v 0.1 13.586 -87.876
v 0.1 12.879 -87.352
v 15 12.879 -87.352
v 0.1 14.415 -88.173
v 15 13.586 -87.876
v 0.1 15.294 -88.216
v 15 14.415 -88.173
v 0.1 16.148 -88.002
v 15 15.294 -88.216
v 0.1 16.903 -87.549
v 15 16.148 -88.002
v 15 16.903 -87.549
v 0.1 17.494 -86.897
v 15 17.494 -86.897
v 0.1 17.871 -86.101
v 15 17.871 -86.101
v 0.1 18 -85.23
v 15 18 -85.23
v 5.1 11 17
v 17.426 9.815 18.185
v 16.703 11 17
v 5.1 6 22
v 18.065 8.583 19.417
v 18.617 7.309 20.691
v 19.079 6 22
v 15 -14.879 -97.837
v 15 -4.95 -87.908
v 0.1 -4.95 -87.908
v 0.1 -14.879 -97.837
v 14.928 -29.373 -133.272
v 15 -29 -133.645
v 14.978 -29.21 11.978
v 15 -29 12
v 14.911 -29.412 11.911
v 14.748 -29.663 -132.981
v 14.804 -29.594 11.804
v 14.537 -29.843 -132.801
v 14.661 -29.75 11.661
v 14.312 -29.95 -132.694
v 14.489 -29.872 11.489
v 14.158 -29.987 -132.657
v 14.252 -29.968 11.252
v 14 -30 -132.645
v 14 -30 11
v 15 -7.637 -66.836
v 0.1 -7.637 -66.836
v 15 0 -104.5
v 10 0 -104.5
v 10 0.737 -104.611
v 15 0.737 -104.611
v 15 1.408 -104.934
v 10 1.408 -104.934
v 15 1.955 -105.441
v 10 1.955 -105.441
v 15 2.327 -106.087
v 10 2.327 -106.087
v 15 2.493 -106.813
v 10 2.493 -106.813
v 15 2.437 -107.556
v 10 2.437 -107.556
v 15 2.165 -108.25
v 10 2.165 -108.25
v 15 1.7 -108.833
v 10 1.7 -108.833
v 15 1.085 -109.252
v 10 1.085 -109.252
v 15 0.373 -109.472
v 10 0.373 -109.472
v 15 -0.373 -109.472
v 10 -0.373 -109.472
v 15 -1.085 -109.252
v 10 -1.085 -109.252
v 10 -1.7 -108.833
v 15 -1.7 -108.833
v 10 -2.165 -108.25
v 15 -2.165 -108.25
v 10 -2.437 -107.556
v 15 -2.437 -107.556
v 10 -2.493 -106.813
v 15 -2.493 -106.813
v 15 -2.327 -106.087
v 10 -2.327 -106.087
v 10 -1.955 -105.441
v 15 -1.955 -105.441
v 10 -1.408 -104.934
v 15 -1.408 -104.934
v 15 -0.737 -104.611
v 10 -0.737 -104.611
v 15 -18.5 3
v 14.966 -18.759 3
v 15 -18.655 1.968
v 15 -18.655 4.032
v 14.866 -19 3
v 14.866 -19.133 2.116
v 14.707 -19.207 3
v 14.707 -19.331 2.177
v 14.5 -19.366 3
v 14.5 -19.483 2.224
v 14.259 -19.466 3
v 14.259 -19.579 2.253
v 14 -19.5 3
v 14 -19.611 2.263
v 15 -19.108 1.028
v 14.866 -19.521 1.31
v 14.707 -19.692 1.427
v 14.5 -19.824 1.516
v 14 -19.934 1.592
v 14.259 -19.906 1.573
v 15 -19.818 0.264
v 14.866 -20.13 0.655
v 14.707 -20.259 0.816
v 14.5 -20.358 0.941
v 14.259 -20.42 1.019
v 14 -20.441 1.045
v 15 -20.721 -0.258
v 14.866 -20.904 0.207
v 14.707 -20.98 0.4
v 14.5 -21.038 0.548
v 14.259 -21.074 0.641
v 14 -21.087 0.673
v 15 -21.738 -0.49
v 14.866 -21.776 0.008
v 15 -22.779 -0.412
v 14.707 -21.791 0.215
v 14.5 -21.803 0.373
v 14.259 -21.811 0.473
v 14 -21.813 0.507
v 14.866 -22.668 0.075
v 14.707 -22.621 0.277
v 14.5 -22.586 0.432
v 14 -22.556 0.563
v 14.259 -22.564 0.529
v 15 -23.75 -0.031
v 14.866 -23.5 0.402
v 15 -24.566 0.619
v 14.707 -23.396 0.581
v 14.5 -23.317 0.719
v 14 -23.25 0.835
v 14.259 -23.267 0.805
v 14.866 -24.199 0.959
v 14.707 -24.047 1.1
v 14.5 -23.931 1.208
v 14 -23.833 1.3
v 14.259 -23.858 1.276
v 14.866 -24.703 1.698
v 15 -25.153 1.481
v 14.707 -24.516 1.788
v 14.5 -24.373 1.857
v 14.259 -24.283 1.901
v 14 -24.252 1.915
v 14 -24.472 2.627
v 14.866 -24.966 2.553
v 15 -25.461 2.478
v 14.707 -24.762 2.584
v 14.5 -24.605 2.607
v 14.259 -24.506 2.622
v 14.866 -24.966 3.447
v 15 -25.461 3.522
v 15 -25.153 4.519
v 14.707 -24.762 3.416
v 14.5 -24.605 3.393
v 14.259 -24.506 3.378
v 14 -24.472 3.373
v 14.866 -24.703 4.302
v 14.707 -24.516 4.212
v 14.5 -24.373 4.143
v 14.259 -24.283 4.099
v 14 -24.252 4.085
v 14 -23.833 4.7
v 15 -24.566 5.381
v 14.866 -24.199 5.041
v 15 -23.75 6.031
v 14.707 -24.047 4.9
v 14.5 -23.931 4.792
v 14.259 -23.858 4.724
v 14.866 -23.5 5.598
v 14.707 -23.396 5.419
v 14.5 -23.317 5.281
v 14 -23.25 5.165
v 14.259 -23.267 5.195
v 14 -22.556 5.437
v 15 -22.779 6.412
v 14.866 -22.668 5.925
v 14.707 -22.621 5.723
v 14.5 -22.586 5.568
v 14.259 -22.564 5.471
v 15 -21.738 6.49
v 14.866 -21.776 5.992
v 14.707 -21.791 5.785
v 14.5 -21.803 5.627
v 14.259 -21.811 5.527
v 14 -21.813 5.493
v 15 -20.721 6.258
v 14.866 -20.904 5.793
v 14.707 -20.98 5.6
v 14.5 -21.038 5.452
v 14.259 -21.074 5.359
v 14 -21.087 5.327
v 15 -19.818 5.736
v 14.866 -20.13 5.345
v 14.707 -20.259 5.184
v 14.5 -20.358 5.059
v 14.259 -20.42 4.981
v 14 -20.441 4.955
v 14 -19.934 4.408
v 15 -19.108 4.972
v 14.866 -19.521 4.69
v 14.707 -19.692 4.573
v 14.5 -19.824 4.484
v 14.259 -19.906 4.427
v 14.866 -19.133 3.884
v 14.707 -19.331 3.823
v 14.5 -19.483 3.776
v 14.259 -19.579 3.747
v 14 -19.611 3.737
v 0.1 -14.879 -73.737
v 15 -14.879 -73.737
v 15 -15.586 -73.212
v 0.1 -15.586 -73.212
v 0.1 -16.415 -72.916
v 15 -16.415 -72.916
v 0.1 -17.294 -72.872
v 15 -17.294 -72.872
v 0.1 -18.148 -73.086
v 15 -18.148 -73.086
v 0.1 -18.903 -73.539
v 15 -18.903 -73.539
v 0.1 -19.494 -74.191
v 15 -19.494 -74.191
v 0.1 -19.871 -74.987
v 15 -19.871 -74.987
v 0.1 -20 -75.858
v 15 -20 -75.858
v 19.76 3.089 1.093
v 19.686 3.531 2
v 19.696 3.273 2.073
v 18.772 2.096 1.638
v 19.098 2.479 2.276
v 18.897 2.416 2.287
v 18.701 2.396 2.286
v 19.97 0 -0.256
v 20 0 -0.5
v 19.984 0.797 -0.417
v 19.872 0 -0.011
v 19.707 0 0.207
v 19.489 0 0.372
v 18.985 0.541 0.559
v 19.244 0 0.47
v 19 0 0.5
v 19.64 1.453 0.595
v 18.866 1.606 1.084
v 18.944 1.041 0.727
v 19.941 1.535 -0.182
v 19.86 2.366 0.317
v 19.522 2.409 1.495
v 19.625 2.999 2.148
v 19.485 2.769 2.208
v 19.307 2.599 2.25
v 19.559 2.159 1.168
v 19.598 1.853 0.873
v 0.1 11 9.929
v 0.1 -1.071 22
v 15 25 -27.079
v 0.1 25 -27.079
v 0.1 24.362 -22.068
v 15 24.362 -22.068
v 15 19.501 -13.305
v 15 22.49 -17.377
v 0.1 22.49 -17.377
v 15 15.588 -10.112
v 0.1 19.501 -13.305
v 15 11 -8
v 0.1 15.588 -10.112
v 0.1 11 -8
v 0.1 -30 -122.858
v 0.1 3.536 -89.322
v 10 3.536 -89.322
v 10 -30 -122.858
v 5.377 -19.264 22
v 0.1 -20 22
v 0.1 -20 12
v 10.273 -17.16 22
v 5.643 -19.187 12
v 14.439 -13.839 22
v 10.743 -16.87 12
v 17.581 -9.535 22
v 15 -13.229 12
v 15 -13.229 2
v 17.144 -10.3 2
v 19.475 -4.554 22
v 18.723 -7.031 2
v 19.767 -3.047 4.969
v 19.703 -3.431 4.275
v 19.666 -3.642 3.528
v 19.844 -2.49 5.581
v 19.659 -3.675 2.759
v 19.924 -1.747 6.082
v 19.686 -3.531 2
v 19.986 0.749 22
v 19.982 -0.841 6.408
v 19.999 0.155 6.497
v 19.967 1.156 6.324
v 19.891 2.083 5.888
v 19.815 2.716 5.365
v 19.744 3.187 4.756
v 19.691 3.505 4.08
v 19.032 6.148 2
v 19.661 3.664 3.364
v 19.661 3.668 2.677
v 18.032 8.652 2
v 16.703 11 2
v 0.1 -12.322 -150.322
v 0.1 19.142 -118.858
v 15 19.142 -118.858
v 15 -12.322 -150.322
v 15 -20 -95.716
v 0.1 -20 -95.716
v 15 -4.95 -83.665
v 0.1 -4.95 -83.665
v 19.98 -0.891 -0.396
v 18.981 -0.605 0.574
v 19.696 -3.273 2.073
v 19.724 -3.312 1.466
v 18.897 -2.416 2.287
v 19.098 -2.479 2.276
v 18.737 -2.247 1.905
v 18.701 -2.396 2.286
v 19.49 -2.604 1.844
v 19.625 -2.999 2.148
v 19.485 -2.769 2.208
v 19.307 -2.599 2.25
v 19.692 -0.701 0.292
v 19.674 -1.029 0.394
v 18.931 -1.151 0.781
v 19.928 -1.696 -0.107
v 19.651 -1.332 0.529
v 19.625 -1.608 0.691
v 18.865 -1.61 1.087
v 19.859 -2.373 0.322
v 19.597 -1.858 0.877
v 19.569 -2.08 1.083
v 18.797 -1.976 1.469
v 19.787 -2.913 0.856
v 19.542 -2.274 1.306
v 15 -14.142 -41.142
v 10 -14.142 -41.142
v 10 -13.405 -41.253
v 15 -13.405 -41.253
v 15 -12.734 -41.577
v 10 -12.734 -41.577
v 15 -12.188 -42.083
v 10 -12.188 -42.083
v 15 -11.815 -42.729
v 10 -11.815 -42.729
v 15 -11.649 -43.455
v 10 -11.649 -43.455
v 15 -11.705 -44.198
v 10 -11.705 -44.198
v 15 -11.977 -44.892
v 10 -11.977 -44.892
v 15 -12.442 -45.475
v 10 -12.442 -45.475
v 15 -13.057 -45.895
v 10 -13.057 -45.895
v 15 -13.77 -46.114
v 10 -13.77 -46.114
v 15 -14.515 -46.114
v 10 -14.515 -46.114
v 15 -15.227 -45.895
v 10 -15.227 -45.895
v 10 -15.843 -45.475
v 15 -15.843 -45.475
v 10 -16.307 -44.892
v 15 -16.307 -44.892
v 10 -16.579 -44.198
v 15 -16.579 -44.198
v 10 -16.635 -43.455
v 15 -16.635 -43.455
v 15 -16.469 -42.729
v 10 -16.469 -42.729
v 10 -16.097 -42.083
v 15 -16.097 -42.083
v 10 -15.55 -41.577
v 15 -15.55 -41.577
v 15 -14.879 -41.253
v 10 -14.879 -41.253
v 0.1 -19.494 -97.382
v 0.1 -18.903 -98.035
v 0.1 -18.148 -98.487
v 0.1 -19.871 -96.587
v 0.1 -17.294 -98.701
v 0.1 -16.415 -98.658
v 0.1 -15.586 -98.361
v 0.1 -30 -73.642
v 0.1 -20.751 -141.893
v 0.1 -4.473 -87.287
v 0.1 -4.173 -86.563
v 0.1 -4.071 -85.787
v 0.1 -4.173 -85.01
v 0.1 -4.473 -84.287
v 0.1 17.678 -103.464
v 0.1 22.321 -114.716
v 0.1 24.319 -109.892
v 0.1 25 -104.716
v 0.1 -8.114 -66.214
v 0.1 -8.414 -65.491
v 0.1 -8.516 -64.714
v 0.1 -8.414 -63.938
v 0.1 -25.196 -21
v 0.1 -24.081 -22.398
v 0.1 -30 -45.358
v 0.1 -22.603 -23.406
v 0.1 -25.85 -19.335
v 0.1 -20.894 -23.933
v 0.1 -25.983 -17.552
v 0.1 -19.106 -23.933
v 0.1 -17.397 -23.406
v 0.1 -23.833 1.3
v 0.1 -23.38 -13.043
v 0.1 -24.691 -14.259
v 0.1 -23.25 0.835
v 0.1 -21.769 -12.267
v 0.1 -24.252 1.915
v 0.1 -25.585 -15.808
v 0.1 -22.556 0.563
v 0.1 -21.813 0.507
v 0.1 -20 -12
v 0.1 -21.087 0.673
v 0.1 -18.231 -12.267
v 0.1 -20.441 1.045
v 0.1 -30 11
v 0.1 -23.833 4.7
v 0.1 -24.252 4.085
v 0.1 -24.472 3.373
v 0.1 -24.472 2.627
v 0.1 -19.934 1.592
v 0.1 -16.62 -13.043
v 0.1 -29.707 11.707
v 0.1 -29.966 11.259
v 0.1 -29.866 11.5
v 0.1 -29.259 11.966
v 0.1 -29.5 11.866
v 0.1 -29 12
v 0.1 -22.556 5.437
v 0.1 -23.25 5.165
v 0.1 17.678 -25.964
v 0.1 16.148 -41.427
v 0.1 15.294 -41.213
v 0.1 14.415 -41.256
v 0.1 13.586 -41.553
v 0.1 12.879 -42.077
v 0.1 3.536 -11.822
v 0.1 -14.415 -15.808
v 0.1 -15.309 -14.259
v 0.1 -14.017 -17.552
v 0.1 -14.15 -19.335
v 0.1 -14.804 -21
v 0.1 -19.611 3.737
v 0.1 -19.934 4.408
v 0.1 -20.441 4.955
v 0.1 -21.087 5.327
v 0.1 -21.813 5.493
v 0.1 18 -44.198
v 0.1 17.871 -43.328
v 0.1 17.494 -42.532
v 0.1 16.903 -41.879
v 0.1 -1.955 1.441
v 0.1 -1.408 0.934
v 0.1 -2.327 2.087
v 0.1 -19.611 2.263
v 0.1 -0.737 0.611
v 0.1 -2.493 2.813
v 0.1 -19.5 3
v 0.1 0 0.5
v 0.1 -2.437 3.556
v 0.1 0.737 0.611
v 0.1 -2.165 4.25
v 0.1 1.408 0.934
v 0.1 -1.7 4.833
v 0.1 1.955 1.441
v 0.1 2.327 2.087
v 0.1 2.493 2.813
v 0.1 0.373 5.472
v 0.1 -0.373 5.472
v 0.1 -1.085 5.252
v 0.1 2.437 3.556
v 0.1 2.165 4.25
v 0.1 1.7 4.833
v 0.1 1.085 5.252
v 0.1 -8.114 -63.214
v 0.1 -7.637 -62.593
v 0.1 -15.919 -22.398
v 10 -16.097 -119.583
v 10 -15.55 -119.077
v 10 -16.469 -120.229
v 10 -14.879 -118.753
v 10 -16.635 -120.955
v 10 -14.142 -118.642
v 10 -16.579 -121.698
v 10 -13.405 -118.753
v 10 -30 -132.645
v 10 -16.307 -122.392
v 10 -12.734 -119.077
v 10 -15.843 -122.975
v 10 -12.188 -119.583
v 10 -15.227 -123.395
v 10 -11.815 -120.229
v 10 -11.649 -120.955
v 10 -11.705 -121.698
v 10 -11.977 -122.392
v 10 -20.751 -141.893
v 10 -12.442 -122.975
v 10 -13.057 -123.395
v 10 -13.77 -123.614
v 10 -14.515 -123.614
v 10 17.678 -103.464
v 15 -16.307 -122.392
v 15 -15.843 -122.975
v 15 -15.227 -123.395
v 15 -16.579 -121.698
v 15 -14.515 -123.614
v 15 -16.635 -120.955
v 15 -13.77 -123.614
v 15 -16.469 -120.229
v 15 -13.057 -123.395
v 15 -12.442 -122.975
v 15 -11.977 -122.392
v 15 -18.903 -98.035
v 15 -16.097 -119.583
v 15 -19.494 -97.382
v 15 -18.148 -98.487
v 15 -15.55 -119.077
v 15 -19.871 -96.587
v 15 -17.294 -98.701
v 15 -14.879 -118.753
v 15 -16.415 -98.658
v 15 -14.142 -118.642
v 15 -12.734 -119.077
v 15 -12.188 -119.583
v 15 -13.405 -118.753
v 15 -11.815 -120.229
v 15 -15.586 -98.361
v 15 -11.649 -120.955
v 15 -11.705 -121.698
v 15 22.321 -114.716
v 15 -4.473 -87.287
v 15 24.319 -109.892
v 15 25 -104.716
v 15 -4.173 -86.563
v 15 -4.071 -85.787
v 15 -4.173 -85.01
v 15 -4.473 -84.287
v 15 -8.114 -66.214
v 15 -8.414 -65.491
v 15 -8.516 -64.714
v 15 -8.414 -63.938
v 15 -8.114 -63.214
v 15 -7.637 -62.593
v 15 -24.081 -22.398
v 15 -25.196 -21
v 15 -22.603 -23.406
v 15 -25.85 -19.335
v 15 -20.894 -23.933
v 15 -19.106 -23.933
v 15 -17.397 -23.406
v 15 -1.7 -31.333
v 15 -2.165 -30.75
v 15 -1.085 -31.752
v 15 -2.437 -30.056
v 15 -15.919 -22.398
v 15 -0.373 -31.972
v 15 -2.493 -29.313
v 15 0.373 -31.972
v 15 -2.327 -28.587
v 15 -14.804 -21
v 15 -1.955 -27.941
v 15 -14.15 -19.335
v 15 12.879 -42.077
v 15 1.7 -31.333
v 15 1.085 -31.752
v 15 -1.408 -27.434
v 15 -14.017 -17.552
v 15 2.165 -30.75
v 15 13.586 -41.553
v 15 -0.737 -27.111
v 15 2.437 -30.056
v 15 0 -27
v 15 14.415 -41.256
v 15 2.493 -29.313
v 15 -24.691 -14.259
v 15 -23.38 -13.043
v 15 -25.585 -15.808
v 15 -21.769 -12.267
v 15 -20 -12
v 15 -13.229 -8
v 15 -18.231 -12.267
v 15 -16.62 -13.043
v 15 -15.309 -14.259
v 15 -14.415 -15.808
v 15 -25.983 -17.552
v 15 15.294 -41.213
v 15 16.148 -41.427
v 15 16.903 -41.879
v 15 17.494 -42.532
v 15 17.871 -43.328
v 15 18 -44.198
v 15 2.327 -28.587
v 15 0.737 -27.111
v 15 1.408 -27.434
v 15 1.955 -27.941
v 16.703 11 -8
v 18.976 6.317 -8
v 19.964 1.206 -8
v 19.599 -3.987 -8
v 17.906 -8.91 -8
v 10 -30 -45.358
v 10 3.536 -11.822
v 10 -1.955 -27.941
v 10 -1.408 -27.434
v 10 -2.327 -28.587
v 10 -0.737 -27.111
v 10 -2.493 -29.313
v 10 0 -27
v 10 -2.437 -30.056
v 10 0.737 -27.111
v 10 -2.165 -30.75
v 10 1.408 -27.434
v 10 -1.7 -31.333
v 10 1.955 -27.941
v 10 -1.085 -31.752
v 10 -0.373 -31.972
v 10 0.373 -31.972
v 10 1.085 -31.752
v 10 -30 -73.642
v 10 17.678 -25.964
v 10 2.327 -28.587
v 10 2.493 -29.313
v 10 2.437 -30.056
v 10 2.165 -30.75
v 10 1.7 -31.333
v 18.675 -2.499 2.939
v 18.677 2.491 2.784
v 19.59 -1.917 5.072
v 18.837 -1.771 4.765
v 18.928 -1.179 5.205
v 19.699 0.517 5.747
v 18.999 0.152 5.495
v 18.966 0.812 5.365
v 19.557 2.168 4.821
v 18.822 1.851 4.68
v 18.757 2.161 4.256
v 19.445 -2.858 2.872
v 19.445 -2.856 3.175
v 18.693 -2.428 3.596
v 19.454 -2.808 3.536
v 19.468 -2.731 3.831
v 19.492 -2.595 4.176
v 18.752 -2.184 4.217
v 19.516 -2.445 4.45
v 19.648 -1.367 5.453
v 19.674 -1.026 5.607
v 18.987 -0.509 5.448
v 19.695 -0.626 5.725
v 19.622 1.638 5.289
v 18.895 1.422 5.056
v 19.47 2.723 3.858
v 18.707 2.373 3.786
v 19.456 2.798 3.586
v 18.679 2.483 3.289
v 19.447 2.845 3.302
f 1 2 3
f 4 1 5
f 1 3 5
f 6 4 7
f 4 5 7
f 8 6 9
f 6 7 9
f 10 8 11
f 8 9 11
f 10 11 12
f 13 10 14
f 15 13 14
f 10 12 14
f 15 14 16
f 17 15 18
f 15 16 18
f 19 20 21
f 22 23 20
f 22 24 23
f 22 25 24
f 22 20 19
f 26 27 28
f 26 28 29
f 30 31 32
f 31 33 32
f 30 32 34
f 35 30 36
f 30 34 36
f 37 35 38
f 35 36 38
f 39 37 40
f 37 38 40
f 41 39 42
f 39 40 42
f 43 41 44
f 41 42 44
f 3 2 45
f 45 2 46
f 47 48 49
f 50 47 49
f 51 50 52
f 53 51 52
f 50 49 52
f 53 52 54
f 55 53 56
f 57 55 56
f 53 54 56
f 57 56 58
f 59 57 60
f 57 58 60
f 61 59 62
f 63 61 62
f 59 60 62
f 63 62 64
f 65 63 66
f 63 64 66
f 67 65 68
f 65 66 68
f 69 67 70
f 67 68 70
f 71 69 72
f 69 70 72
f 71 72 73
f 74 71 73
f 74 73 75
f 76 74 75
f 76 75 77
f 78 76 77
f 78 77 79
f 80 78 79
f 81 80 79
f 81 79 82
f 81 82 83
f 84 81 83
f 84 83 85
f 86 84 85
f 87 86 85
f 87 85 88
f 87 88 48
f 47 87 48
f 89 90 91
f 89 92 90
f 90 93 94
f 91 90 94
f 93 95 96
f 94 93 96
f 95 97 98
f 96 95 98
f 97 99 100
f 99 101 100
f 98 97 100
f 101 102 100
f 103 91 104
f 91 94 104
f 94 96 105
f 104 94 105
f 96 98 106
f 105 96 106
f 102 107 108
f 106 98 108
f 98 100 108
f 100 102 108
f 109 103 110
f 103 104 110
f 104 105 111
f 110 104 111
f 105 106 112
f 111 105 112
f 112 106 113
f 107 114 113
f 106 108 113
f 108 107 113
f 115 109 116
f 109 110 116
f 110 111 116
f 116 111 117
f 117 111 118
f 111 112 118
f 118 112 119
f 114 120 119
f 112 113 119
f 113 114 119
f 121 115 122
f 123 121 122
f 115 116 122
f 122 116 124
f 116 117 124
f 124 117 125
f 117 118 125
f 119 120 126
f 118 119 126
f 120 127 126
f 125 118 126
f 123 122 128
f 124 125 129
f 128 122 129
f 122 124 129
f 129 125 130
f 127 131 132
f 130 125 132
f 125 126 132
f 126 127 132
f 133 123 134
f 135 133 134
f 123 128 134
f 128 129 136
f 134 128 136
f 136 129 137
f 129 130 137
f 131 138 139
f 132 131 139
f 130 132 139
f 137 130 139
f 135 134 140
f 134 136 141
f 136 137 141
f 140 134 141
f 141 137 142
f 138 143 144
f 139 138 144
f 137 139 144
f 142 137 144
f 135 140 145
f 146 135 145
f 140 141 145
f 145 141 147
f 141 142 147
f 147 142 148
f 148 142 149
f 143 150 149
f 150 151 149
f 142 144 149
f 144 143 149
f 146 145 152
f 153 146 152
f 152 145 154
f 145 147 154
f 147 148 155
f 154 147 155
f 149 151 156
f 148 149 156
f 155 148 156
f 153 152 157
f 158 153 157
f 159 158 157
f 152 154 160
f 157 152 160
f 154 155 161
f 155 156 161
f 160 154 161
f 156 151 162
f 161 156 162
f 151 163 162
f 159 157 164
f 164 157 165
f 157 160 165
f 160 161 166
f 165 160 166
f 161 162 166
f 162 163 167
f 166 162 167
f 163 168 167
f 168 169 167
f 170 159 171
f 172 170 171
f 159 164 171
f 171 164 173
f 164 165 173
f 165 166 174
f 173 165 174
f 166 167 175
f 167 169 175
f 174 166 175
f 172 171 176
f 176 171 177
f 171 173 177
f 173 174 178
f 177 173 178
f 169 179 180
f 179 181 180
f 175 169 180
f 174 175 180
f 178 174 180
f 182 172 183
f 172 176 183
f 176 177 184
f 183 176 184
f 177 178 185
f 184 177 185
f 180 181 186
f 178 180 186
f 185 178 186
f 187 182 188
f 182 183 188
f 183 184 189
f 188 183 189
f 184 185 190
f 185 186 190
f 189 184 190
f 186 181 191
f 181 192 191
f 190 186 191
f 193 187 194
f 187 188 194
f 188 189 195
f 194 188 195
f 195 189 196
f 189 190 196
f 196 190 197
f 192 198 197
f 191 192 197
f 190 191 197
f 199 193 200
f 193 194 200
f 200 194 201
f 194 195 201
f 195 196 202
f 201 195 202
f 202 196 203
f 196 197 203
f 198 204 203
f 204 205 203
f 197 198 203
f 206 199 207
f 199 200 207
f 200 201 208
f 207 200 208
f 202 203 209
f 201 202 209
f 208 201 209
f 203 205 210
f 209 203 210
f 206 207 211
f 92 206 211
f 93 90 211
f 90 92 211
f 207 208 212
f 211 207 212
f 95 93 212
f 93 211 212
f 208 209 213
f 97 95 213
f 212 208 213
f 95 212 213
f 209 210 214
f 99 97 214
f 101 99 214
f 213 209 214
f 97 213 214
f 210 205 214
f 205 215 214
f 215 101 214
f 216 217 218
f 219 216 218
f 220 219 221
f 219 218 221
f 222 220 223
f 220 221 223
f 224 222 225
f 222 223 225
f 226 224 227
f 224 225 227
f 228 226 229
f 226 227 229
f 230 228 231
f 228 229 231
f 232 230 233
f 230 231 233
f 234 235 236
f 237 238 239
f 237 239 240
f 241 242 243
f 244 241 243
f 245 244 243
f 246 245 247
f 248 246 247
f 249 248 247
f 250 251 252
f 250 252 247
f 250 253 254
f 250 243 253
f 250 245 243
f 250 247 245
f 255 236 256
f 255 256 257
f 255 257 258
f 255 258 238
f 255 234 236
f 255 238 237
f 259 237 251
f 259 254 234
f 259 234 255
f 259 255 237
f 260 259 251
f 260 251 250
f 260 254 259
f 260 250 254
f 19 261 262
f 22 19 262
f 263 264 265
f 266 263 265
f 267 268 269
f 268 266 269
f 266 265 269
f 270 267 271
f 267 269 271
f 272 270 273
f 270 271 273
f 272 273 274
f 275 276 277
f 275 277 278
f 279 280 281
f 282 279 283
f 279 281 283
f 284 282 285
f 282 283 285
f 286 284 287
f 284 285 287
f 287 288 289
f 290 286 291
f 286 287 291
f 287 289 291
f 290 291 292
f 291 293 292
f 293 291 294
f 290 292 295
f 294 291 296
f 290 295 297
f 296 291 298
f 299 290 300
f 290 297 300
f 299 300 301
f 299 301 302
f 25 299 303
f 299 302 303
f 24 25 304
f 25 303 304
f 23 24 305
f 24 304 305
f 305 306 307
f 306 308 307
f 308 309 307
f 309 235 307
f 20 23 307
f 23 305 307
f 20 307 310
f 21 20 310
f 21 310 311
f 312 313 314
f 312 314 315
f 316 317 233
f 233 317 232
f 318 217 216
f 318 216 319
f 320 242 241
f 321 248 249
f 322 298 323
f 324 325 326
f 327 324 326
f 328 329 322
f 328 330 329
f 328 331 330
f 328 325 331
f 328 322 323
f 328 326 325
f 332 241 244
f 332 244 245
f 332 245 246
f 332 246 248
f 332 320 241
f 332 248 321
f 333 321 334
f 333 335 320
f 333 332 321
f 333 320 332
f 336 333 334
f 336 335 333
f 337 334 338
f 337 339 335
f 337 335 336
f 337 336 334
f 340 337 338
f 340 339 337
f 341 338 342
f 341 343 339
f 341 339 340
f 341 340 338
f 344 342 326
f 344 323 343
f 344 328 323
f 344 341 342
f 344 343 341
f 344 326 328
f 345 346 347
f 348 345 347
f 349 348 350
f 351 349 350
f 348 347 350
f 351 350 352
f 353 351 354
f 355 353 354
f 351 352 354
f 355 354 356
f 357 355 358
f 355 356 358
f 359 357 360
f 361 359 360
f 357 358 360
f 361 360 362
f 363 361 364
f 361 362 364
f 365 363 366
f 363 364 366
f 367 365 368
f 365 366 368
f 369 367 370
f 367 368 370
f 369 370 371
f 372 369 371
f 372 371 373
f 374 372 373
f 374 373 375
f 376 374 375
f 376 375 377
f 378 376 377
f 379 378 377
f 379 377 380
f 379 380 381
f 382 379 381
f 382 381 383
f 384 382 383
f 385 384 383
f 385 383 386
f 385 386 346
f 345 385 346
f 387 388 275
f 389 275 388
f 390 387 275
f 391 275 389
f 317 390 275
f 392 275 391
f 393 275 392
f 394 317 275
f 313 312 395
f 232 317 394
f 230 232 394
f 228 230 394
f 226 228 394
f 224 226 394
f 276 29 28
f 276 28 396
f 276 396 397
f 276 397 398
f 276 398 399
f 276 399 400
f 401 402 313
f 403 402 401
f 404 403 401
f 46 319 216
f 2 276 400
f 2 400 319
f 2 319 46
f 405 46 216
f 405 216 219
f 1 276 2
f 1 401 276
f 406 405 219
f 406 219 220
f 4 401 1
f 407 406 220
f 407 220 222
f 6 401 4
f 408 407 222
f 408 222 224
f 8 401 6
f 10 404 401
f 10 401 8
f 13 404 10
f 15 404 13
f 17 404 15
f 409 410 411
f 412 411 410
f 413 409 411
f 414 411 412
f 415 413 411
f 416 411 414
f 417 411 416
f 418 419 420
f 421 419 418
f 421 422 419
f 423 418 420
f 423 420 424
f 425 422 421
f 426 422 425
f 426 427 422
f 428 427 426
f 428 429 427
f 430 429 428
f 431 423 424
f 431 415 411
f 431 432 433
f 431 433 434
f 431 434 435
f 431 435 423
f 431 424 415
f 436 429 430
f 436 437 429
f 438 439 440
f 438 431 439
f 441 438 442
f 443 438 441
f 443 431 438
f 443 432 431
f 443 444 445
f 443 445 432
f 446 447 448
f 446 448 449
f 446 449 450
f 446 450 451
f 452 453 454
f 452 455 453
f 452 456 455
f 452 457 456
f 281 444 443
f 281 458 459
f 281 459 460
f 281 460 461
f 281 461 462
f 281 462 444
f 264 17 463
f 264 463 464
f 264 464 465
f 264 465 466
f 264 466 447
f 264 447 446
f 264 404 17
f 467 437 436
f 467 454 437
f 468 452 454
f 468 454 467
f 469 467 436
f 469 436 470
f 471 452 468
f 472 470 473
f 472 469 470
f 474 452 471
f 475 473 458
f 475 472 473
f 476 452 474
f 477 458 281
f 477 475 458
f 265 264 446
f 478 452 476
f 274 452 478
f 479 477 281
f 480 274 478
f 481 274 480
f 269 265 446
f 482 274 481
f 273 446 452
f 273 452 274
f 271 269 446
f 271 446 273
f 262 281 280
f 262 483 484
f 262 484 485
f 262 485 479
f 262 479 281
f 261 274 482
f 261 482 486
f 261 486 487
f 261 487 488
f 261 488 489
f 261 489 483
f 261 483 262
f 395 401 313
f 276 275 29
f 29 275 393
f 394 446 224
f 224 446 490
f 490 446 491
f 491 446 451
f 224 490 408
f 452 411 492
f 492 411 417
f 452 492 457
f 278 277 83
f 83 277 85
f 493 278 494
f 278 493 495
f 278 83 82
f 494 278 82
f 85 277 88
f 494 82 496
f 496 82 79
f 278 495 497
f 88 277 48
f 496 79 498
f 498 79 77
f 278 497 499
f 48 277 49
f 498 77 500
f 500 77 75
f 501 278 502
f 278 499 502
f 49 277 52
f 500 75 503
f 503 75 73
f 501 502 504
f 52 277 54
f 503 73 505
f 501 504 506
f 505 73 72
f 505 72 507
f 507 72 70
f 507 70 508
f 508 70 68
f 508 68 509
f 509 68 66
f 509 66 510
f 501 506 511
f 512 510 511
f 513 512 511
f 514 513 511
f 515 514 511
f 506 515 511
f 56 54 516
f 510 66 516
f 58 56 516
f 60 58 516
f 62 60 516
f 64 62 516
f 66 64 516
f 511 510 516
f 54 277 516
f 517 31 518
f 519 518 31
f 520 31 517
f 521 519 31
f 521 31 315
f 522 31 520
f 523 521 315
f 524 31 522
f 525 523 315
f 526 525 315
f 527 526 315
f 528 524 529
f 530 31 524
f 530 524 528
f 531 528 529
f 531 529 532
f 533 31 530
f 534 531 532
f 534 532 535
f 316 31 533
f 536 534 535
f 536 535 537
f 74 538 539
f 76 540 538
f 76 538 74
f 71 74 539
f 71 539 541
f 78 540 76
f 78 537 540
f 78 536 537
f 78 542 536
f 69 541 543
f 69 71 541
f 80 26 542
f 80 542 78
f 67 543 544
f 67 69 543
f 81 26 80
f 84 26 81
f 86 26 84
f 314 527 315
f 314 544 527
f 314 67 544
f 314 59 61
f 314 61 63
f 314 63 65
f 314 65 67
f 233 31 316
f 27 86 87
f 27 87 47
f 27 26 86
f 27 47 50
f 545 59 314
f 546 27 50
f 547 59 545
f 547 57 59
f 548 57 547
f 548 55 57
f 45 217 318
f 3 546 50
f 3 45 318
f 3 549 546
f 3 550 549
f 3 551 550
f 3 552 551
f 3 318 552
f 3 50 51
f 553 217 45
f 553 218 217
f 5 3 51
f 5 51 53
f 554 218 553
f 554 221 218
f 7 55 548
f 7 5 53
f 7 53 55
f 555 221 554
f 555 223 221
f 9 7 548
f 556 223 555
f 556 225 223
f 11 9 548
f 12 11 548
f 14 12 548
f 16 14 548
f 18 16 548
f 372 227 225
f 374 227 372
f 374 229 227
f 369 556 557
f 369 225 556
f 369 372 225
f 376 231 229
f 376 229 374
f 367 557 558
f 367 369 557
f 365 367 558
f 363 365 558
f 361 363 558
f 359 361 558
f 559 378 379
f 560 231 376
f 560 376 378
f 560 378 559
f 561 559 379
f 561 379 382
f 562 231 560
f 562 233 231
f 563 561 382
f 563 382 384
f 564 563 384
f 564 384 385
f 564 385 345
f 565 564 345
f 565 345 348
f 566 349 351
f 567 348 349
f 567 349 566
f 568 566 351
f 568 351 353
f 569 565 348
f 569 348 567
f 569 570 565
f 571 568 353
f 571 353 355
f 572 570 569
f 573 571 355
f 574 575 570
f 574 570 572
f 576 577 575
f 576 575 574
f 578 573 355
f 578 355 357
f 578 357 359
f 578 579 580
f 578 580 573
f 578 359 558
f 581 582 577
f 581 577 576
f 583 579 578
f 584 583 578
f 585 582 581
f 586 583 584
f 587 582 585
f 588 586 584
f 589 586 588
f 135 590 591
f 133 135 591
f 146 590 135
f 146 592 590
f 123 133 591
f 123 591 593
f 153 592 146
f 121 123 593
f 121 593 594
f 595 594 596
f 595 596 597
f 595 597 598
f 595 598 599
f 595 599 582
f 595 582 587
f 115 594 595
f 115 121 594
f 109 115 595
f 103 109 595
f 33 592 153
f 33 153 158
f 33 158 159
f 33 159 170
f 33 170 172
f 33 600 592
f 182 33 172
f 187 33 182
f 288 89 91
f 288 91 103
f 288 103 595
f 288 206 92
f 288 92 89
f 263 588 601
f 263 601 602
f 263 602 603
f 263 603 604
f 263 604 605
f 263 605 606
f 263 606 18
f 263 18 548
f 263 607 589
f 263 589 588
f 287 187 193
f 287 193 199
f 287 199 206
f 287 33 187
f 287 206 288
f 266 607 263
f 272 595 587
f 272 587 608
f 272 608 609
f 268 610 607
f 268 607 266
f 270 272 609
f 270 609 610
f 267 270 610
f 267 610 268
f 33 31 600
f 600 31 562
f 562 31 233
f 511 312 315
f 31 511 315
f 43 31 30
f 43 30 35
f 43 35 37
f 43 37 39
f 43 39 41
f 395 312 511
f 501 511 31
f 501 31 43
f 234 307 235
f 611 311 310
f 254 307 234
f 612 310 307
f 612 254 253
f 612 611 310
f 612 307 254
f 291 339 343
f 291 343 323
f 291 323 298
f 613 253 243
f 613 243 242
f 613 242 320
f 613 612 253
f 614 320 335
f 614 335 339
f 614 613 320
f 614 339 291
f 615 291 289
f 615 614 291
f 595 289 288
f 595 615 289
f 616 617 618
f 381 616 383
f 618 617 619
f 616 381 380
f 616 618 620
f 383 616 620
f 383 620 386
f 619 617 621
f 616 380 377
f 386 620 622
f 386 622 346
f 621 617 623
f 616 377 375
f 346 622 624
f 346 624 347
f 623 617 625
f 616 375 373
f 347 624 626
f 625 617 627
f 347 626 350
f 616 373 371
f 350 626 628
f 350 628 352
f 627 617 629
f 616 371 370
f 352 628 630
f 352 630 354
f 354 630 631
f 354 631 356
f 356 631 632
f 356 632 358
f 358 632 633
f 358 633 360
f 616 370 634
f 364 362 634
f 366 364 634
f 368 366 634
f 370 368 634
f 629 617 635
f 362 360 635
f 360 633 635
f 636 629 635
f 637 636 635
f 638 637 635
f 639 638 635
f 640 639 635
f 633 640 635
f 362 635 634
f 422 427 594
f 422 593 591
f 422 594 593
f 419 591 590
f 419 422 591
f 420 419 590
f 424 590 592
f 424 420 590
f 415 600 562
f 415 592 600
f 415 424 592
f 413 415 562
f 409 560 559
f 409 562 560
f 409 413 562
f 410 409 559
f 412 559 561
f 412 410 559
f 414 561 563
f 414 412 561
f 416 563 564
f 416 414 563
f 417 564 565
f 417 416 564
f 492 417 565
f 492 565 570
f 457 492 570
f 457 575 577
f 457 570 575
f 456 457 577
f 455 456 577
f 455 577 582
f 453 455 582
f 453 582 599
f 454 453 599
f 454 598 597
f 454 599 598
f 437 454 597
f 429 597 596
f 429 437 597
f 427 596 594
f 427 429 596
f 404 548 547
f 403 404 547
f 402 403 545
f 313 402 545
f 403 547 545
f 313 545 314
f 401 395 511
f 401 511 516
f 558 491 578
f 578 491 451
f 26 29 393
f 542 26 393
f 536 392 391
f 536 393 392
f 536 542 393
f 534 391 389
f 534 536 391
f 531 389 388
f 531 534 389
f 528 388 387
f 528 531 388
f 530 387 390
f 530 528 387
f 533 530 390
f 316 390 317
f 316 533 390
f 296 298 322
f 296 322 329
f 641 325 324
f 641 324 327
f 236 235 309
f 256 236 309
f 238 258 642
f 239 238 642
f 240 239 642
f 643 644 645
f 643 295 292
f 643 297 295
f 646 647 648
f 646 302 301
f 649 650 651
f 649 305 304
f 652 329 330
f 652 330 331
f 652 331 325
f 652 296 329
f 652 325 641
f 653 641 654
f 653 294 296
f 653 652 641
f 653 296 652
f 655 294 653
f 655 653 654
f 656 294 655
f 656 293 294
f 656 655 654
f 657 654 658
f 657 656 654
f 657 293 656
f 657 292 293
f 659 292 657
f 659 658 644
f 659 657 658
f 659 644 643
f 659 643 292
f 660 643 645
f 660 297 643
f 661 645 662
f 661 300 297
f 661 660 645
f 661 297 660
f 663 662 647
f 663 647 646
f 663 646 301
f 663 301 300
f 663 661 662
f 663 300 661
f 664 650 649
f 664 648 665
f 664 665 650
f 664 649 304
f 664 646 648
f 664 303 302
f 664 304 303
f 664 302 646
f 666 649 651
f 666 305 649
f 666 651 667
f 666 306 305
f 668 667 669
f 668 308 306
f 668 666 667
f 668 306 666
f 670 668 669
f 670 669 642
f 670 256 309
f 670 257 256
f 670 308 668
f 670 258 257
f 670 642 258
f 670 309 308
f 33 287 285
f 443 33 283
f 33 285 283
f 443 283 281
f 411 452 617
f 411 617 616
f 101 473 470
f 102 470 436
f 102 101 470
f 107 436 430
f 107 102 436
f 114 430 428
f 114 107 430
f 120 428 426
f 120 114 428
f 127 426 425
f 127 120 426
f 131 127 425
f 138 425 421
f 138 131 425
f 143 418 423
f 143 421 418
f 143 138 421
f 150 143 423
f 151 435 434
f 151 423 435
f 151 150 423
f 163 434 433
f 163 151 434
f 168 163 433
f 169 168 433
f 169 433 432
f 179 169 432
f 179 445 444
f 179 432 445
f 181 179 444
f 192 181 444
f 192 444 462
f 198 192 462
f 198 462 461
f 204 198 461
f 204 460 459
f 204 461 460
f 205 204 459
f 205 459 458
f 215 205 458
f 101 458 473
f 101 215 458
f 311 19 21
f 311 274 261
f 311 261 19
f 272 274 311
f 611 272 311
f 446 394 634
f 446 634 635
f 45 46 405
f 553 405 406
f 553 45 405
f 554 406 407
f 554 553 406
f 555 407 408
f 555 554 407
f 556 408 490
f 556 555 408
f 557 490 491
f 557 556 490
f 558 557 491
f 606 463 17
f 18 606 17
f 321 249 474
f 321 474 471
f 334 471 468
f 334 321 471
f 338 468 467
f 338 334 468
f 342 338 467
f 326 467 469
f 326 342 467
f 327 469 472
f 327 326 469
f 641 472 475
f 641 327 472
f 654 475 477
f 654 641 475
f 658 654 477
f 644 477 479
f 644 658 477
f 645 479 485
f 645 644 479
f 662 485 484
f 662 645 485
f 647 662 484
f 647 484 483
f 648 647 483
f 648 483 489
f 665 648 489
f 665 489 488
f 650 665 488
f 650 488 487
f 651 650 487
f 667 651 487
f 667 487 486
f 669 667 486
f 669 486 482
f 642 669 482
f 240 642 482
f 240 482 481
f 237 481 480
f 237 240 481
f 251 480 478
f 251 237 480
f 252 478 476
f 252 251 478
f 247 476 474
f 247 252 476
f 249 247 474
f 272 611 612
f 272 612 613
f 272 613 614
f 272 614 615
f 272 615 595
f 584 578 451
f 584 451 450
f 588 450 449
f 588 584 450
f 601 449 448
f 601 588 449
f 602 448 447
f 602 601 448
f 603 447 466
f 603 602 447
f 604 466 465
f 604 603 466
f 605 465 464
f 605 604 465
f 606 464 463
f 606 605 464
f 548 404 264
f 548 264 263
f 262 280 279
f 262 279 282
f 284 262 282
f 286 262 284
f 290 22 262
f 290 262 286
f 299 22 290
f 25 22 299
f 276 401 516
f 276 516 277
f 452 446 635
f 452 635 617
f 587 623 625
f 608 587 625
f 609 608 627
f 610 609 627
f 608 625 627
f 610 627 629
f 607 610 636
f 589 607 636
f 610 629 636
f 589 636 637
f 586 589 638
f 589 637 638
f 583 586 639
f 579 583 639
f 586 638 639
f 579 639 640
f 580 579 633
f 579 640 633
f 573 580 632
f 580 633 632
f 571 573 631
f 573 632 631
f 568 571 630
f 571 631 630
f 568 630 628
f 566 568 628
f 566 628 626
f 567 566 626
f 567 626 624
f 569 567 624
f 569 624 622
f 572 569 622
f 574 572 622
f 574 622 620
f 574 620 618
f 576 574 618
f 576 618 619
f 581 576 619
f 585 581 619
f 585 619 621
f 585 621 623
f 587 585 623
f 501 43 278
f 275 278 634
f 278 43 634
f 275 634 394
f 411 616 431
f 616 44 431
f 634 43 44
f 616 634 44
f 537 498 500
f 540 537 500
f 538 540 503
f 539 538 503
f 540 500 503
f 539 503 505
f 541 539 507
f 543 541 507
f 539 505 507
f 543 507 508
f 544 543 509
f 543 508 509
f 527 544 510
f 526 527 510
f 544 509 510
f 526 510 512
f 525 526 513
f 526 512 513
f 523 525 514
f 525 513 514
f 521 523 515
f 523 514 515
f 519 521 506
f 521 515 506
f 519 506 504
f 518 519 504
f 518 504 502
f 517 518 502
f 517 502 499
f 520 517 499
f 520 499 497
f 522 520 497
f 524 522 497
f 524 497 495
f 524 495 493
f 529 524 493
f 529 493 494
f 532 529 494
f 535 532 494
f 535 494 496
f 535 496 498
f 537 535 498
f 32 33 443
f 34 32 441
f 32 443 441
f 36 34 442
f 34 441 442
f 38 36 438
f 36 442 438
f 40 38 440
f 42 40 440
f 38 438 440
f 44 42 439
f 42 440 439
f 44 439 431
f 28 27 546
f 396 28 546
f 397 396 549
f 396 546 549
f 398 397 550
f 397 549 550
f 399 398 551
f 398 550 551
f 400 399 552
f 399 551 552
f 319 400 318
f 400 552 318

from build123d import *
from build123d.topology import SkipClean

# Parameters (mm, degrees)
EXTRUDE_1_DEPTH            = 21
SKETCH_2_W                 = 20
SKETCH_2_H                 = 20
CUT_EXTRUDE_1_DEPTH        = 10
SKETCH_3_R                 = 25
EXTRUDE_2_DEPTH            = 2
SKETCH_4_W                 = 20
SKETCH_4_H                 = 20
CUT_EXTRUDE_2_DEPTH        = 20
SKETCH_5_W                 = 67.669648092
SKETCH_5_H                 = 52.455829112
CUT_EXTRUDE_3_DEPTH        = 22
EXTRUDE_5_DEPTH            = 1
CUT_EXTRUDE_START          = -6
CUT_EXTRUDE_12_DEPTH       = 6
CUT_EXTRUDE_13_DEPTH       = 2
SKETCH_21_W                = 20
SKETCH_21_H                = 20
EXTRUDE_7_DEPTH            = 19
SKETCH_22_W                = 30
SKETCH_22_H                = 20
EXTRUDE_8_DEPTH            = 10
EXTRUDE_START              = 10
EXTRUDE_9_DEPTH            = 10
SKETCH_24_W                = 30
SKETCH_24_H                = 50
EXTRUDE_10_DEPTH           = 160
SKETCH_26_R                = 2.5
CUT_EXTRUDE_15_DEPTH       = 50
CUT_EXTRUDE_1_2_DEPTH      = 10
CUT_EXTRUDE_1_2_DEPTH_BACK = 10
SKETCH_28_W                = 30
SKETCH_28_H                = 160
EXTRUDE_11_DEPTH           = 5
CUT_EXTRUDE_16_DEPTH       = 25
CUT_EXTRUDE_16_DEPTH_BACK  = 60
SKETCH_29_R                = 2.5
CUT_EXTRUDE_17_DEPTH       = 60
CUT_EXTRUDE_18_DEPTH       = 60
CUT_EXTRUDE_18_DEPTH_BACK  = 60
CUT_EXTRUDE_19_DEPTH       = 60
CUT_EXTRUDE_19_DEPTH_BACK  = 60
FILLET_4_R                 = 3
CUT_EXTRUDE_20_DEPTH       = 60
CUT_EXTRUDE_20_DEPTH_BACK  = 60
SKETCH_33_R                = 6
CUT_EXTRUDE_21_DEPTH       = 60
FILLET_5_R                 = 20
SKETCH_35_R                = 2.5
CUT_EXTRUDE_22_DEPTH       = 60
FILLET_6_R                 = 20
SKETCH_36_W                = 257.466692503
SKETCH_36_H                = 187.225779306
CUT_EXTRUDE_23_DEPTH       = 82
CUT_EXTRUDE_24_DEPTH       = 0.1
FILLET_7_R                 = 1
FILLET_8_R                 = 1
CHAMFER_1_SIZE             = 5
CHAMFER_2_SIZE             = 5


with BuildPart() as part:
    # 草图1 → 凸台-拉伸1 (new body)
    with BuildSketch(Plane.XY):
        with BuildLine():
            Line((16.703293088, 11), (-16.703293088, 11))
            ThreePointArc((-16.703293088, 11), (0, -20), (16.703293088, 11))
        make_face()
    extrude(amount=EXTRUDE_1_DEPTH)

    # 草图2 → Cut-Extrude 1 (cut)
    with BuildSketch(Plane.XY.offset(21)):
        Rectangle(SKETCH_2_W, SKETCH_2_H)
    extrude(amount=-CUT_EXTRUDE_1_DEPTH, mode=Mode.SUBTRACT)

    # 草图3 → 凸台-拉伸2 (add)
    with BuildSketch(Plane(origin=(0, 0, 0), x_dir=(-1, 0, 0), z_dir=(0, 0, -1))):
        Circle(SKETCH_3_R)
        with BuildLine():
            Line((16.703293088, 11), (-16.703293088, 11))
            ThreePointArc((-16.703293088, 11), (0, -20), (16.703293088, 11))
        make_face(mode=Mode.SUBTRACT)
    extrude(amount=-EXTRUDE_2_DEPTH)

    # 草图4 → 切除-拉伸2 (cut)
    with BuildSketch(Plane.XY.offset(11)):
        Rectangle(SKETCH_4_W, SKETCH_4_H)
    extrude(amount=-CUT_EXTRUDE_2_DEPTH, mode=Mode.SUBTRACT)

    # 草图5 → 切除-拉伸3 (cut)
    with BuildSketch(Plane(origin=(0, 11, 0), x_dir=(1, 0, 0), z_dir=(0, 1, 0))):
        Rectangle(SKETCH_5_W, SKETCH_5_H)
    extrude(amount=CUT_EXTRUDE_3_DEPTH, mode=Mode.SUBTRACT)

    # 草图10 → 凸台-拉伸5 (add)
    with BuildSketch(Plane.XY.offset(21)):
        with BuildLine():
            Line((16.703293088, 11), (-16.703293088, 11))
            ThreePointArc((-16.703293088, 11), (0, -20), (16.703293088, 11))
        make_face()
    extrude(amount=EXTRUDE_5_DEPTH)

    # 草图18 → 切除-拉伸12 (cut)
    with SkipClean():  # the faces are left unmerged after this step: merging them gives an invalid solid
        with BuildSketch(Plane.XY.offset(2).offset(CUT_EXTRUDE_START)):
            with BuildLine():
                Line((-16.703293088, 11), (-22.449944321, 11))
                ThreePointArc((-22.449944321, 11), (0, -25), (22.449944321, 11))
                Line((22.449944321, 11), (16.703293088, 11))
                ThreePointArc((16.703293088, 11), (0, -20), (-16.703293088, 11))
            make_face()
        extrude(amount=CUT_EXTRUDE_12_DEPTH, mode=Mode.SUBTRACT)

    # 草图19 → 切除-拉伸13 (cut)
    with BuildSketch(Plane(origin=(0, 0, 0), x_dir=(-1, 0, 0), z_dir=(0, 0, -1))):
        with BuildLine():
            Line((16.703293088, 11), (-16.703293088, 11))
            ThreePointArc((-16.703293088, 11), (0, -20), (16.703293088, 11))
        make_face()
    extrude(amount=-CUT_EXTRUDE_13_DEPTH, mode=Mode.SUBTRACT)

    # 草图21 → 凸台-拉伸7 (add)
    with BuildSketch(Plane(origin=(0, 0, 21), x_dir=(-1, 0, 0), z_dir=(0, 0, -1))):
        Rectangle(SKETCH_21_W, SKETCH_21_H)
    extrude(amount=EXTRUDE_7_DEPTH)

    # 草图22 → 凸台-拉伸8 (add)
    with BuildSketch(Plane(origin=(0, 0, 2), x_dir=(-1, 0, 0), z_dir=(0, 0, -1))):
        with Locations((0, -20)):
            Rectangle(SKETCH_22_W, SKETCH_22_H)
    extrude(amount=-EXTRUDE_8_DEPTH)

    # 草图23 → 凸台-拉伸9 (add)
    with SkipClean():  # the faces are left unmerged after this step: merging them gives an invalid solid
        with BuildSketch(Plane(origin=(0, 0, 2), x_dir=(-1, 0, 0), z_dir=(0, 0, -1)).offset(EXTRUDE_START)):
            with BuildLine():
                Line((-15, -13.228756555), (-15, -30))
                Line((-15, -30), (15, -30))
                Line((15, -30), (15, -13.228756555))
                ThreePointArc((15, -13.228756555), (19.950760868, -1.402547961), (16.703293088, 11))
                Line((16.703293088, 11), (-16.703293088, 11))
                ThreePointArc((-16.703293088, 11), (-19.950760868, -1.402547961), (-15, -13.228756555))
            make_face()
        extrude(amount=-EXTRUDE_9_DEPTH)

    # 草图24 → 凸台-拉伸10 (add)
    with SkipClean():  # the faces are left unmerged after this step: merging them gives an invalid solid
        with BuildSketch(Plane(origin=(0, 0, -8), x_dir=(-1, 0, 0), z_dir=(0, 0, -1))):
            with Locations((0, -5)):
                Rectangle(SKETCH_24_W, SKETCH_24_H)
        extrude(amount=EXTRUDE_10_DEPTH)

    # 草图26 → 切除-拉伸15 (cut)
    with SkipClean():  # the faces are left unmerged after this step: merging them gives an invalid solid
        with BuildSketch(Plane.ZY.offset(15)):
            with Locations((-107, 0)):
                Circle(SKETCH_26_R)
            with Locations((-29.5, 0)):
                Circle(SKETCH_26_R)
        extrude(amount=-CUT_EXTRUDE_15_DEPTH, mode=Mode.SUBTRACT)

    # 草图27 → Cut-Extrude 1 2 (cut, two sides: drawn at the far end of the back side and taken through both)
    with SkipClean():  # the faces are left unmerged after this step: merging them gives an invalid solid
        with BuildSketch(Plane(origin=(0, 0, 0), x_dir=(0, 0, -1), z_dir=(1, 0, 0)).offset(-CUT_EXTRUDE_1_2_DEPTH_BACK)):
            Polygon((89.32233047, 3.535533906), (138.819805153, -45.961940777), (152.961940777, -31.819805153), (103.464466094, 17.67766953), align=None)
            Polygon((11.82233047, 3.535533906), (61.319805153, -45.961940777), (75.461940777, -31.819805153), (25.964466094, 17.67766953), align=None)
        extrude(amount=CUT_EXTRUDE_1_2_DEPTH + CUT_EXTRUDE_1_2_DEPTH_BACK, mode=Mode.SUBTRACT)

    # 草图28 → 凸台-拉伸11 (add)
    with SkipClean():  # the faces are left unmerged after this step: merging them gives an invalid solid
        with BuildSketch(Plane(origin=(0, 20, 0), x_dir=(1, 0, 0), z_dir=(0, 1, 0))):
            with Locations((0, 88)):
                Rectangle(SKETCH_28_W, SKETCH_28_H)
        extrude(amount=EXTRUDE_11_DEPTH)

    # 草图29 → 切除-拉伸16 (cut, two sides: drawn at the far end of the back side and taken through both)
    with SkipClean():  # the faces are left unmerged after this step: merging them gives an invalid solid
        with BuildSketch(Plane.ZY.offset(15).offset(-CUT_EXTRUDE_16_DEPTH_BACK)):
            with Locations(Location((3, 0, 0), (0, 0, 180))):
                Circle(SKETCH_29_R)
            with Locations(Location((3, -22, 0), (0, 0, 90))):
                Circle(SKETCH_29_R)
        extrude(amount=CUT_EXTRUDE_16_DEPTH + CUT_EXTRUDE_16_DEPTH_BACK, mode=Mode.SUBTRACT)

    # 草图30 → 切除-拉伸17 (cut)
    with SkipClean():  # the faces are left unmerged after this step: merging them gives an invalid solid
        with BuildSketch(Plane.ZY.offset(15)):
            Polygon((-113, 25), (-168, -30), (-168, 25), align=None)
        extrude(amount=-CUT_EXTRUDE_17_DEPTH, mode=Mode.SUBTRACT)

    # 草图31 → 切除-拉伸18 (cut, two sides: drawn at the far end of the back side and taken through both)
    with SkipClean():  # the faces are left unmerged after this step: merging them gives an invalid solid
        with BuildSketch(Plane(origin=(0, 0, 0), x_dir=(0, 0, -1), z_dir=(1, 0, 0)).offset(-CUT_EXTRUDE_18_DEPTH_BACK)):
            Polygon((92.473088065, 18), (64.714466094, -9.758621971), (36.955844123, 18), align=None)
        extrude(amount=CUT_EXTRUDE_18_DEPTH + CUT_EXTRUDE_18_DEPTH_BACK, mode=Mode.SUBTRACT)

    # 草图32 → 切除-拉伸19 (cut, two sides: drawn at the far end of the back side and taken through both)
    with SkipClean():  # the faces are left unmerged after this step: merging them gives an invalid solid
        with BuildSketch(Plane(origin=(0, 0, 0), x_dir=(0, 0, -1), z_dir=(1, 0, 0)).offset(-CUT_EXTRUDE_19_DEPTH_BACK)):
            Polygon((85.786796564, -2.828427125), (102.95836944, -20), (68.615223689, -20), align=None)
        extrude(amount=CUT_EXTRUDE_19_DEPTH + CUT_EXTRUDE_19_DEPTH_BACK, mode=Mode.SUBTRACT)

    # 圆角4
    fillet_4_edges = [part.edges().sort_by_distance(p)[0] for p in [
        (0, 18, -92.473088065),
        (0, 18, -36.955844123),
        (0, -9.758621971, -64.714466094),
        (0, -2.828427125, -85.786796564),
        (0, -20, -68.615223689),
        (0, -20, -102.95836944),
    ]]
    fillet(fillet_4_edges, radius=FILLET_4_R)

    # 草图33 → 切除-拉伸20 (cut, two sides: drawn at the far end of the back side and taken through both)
    with BuildSketch(Plane(origin=(0, 0, 0), x_dir=(0, 0, -1), z_dir=(1, 0, 0)).offset(-CUT_EXTRUDE_20_DEPTH_BACK)):
        with Locations(Location((18, -20, 0), (0, 0, 180))):
            Circle(SKETCH_33_R)
    extrude(amount=CUT_EXTRUDE_20_DEPTH + CUT_EXTRUDE_20_DEPTH_BACK, mode=Mode.SUBTRACT)

    # 草图34 → 切除-拉伸21 (cut)
    with BuildSketch(Plane.ZY.offset(15)):
        Polygon((-150.32233047, -12.32233047), (-132.644660941, -30), (-168, -30), align=None)
    extrude(amount=-CUT_EXTRUDE_21_DEPTH, mode=Mode.SUBTRACT)

    # 圆角5
    fillet_5_edges = [part.edges().sort_by_distance(p)[0] for p in [
        (0, 25, -113),
    ]]
    fillet(fillet_5_edges, radius=FILLET_5_R)

    # 草图35 → 切除-拉伸22 (cut)
    with BuildSketch(Plane.ZY.offset(15)):
        with Locations((-29.5, 0)):
            Circle(SKETCH_35_R)
        with Locations((-107, 0)):
            Circle(SKETCH_35_R)
        with Locations((-121.142135624, -14.142135624)):
            Circle(SKETCH_35_R)
        with Locations((-43.642135624, -14.142135624)):
            Circle(SKETCH_35_R)
    extrude(amount=-CUT_EXTRUDE_22_DEPTH, mode=Mode.SUBTRACT)

    # 圆角6
    # the kernel refuses this fillet: 20 mm, written as the material it takes off along each edge
    with BuildSketch(Plane(origin=(-62.696960071, 25, -8), x_dir=(0, 0, -1), z_dir=(1, 0, 0))) as fillet_6_piece_1:
        with BuildLine():
            CenterArc((19.078784028, -20), FILLET_6_R, 90, 72.542396876)
            Line((0, -14), (-0.381575681, -13.88))
            ThreePointArc((-0.381575681, -13.88), (-0.4, -7), (-0.4, 0))
            Line((-0.4, 0), (0, 0.4))
            Line((0, 0.4), (19.078784028, 0.4))
            Line((19.078784028, 0.4), (19.078784028, 0))
        make_face()
    extrude(amount=125.393920142, mode=Mode.SUBTRACT)

    # 草图36 → 切除-拉伸23 (cut)
    with BuildSketch(Plane(origin=(0, 0, 0), x_dir=(0, 0, -1), z_dir=(1, 0, 0))):
        with Locations((64.036181404, -32.621103346)):
            Rectangle(SKETCH_36_W, SKETCH_36_H)
    extrude(amount=-CUT_EXTRUDE_23_DEPTH, mode=Mode.SUBTRACT)

    # 草图37 → 切除-拉伸24 (cut)
    with BuildSketch(Plane.ZY):
        with BuildLine():
            Line((-11.82233047, 3.535533906), (-45.357864376, -30))
            Line((-45.357864376, -30), (12, -30))
            Line((12, -30), (12, -20))
            Line((12, -20), (22, -20))
            Line((22, -20), (22, 11))
            Line((22, 11), (-8, 11))
            ThreePointArc((-8, 11), (-15.246624462, 21.124515497), (-27.078784028, 25))
            Line((-27.078784028, 25), (-104.715728753, 25))
            ThreePointArc((-104.715728753, 25), (-112.3693974, 23.47759065), (-118.857864376, 19.142135624))
            Line((-118.857864376, 19.142135624), (-150.32233047, -12.32233047))
            Line((-150.32233047, -12.32233047), (-141.893398282, -20.751262658))
            Line((-141.893398282, -20.751262658), (-103.464466094, 17.67766953))
            Line((-103.464466094, 17.67766953), (-89.32233047, 3.535533906))
            Line((-89.32233047, 3.535533906), (-122.857864376, -30))
            Line((-122.857864376, -30), (-73.642135624, -30))
            Line((-73.642135624, -30), (-25.964466094, 17.67766953))
            Line((-25.964466094, 17.67766953), (-11.82233047, 3.535533906))
        make_face()
    extrude(amount=-CUT_EXTRUDE_24_DEPTH, mode=Mode.SUBTRACT)

    # 圆角7
    fillet_7_edges = [part.edges().sort_by_distance(p)[0] for p in [
        (20, 0, 5.5),
        (15, -24.5, 3),
    ]]
    fillet(fillet_7_edges, radius=FILLET_7_R)

    # 圆角8
    fillet_8_edges = [part.edges().sort_by_distance(p)[0] for p in [
        (15, -30, -60.32233047),
        (7.55, -30, 12),
    ]]
    fillet(fillet_8_edges, radius=FILLET_8_R)

    # 倒角1
    chamfer_1_edges = [part.edges().sort_by_distance(p)[0] for p in [
        (8.401646544, 11, 22),
    ]]
    chamfer(chamfer_1_edges, length=CHAMFER_1_SIZE)

    # 倒角2
    chamfer_2_edges = [part.edges().sort_by_distance(p)[0] for p in [
        (0.1, 8.5, 19.5),
    ]]
    chamfer(chamfer_2_edges, length=CHAMFER_2_SIZE)


solid = part.part
